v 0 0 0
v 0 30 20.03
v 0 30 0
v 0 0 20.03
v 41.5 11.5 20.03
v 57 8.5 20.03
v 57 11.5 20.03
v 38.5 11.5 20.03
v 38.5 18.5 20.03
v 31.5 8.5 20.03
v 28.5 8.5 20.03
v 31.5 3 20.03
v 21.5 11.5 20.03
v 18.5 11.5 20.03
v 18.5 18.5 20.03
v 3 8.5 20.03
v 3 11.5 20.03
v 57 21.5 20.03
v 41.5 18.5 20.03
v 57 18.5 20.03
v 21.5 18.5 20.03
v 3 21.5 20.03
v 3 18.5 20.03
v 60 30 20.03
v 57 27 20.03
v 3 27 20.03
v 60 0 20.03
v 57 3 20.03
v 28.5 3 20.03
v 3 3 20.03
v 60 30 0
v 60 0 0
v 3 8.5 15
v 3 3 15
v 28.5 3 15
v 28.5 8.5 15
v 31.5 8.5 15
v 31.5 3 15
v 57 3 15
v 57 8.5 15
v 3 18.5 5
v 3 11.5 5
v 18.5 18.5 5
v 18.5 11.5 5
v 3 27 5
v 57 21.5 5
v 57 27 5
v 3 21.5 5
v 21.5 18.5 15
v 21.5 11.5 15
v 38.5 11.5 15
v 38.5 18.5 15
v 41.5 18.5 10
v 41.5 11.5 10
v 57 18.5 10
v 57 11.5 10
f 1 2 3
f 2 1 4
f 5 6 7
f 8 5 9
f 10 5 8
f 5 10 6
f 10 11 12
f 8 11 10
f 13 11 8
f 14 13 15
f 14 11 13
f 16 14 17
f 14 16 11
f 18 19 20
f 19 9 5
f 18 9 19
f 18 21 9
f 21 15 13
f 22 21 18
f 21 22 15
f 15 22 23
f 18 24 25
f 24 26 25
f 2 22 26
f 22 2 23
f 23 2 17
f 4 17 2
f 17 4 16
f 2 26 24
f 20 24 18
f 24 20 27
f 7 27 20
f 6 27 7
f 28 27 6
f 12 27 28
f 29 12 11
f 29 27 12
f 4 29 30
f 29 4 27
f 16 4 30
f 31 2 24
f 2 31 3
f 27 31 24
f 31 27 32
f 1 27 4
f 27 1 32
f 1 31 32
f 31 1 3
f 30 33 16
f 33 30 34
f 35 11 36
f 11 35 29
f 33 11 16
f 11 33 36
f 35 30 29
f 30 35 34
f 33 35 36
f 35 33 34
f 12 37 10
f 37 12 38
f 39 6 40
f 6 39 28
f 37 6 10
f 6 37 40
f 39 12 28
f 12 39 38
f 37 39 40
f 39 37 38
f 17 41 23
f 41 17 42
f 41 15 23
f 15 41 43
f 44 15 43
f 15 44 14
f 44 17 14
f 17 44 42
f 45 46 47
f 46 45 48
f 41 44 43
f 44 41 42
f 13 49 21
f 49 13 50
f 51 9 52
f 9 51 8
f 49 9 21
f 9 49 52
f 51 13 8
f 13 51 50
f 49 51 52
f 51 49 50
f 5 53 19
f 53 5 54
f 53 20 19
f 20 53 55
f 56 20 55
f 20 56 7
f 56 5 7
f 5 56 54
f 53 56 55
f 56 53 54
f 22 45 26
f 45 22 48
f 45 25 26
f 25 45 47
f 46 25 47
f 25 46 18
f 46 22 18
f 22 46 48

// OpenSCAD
// file: caddy_organizer_divider_common.scad
overlap=0.01;

/*
 * separate h,w for top and bottom defines the taper
 * centering defines whether the extra on top or bottom extends fully in the positive direction,
 * or extends equally in both directions.
 * flip***Wise shifts the larger end (top or bottom) in the negative direction so it
 * doesn't need to be mirrored & shifted externally.
 * clipBottomHeight cuts off the lower part of the box up to the height specified
 */
module taperedBox(bw, tw, bl, tl, ht, centerWidthwise=true, centerLengthwise=true, 
        flipWidthwise=false, flipLengthwise=false,
        clipBottomHeight=0) {
    extraWidth = abs(tw-bw);
    extraLength = abs(tl-bl);
    widerWidth = max(tw,bw);
    longerLength = max(tl,bl);
    // Don't shift if not centered or flipped.  When not centered and flipped, shift negative direction
    topWidthShift = ((centerWidthwise) ? -(extraWidth/2) : ((flipWidthwise) ? -extraWidth : 0));
    topLengthShift = ((centerLengthwise) ? -(extraLength/2) : ((flipLengthwise) ? -extraLength : 0));
    echo(str("topWidthShift=",topWidthShift,", topLengthShift=",topLengthShift));
    difference() {
        hull() {
            translate([0,0,0]) 
                cube([bw,bl,overlap]);
            translate([topWidthShift,topLengthShift,ht+overlap])
                cube([tw,tl,overlap]);
        }
        // clip off the bottom of the box (when used as a shallow cutout)        
        translate([-widerWidth/2,-longerLength,-overlap])
            cube([widerWidth*2,longerLength*2,clipBottomHeight+overlap]);
    }
}
// main file
/*
 * Designed for tool caddy found at WM or auto parts stores with
 * center handle and a deep tray on either side.  Makes some of
 * the space useable for holding larger tools upright.
 *
 * TODO: Add support for outer rounded corners
 *
 */
use <caddy_organizer_divider_common.scad>

$fn=50;
overlap=0.01;

// test square sided more wide than long, thicker walls
// evenly split dividers
caddyOrganizerDivider(bottomThickness=5, wallThickness=3, 
    bottomWidth=60, topWidth=60,
    bottomLength=30, topLength=30,
    wallHeight=20,
    crosswaysDividerOffsets=[0,10,20], // rows
    lengthwiseSplits=[[0,30],[0,20,40],[0]],  // row splits
    pocketDepths=[[10,10],[-1,10,15],[-1]]);  // how deep each pocket is

// TODO: implement overcut left and overcut right for each pocket
// to overlap the sidewall.  Changing to cutting the pockets instead of
// not cutting the walls may make it way easier to understand and maintain.

/*
 * This is the primary module for creating a divided box for printing.
 *
 * Default wall thickness is subtracted from the width/length - i.e. The specified
 * dimensions are the "outer" dimension of the overall box.
 * Each offset is aligned with...
 * ALERT: The first element in the crosswaysDivider array is expected to be 0
 *  meaning the corresponding splits are against the first wall
 * ALERT: The first element in each split array is expected to be 0
 *  meaning the corresponding pocketDepth is against the first side
 */
// caddyOrganizerDivider(); // test defaults.
module caddyOrganizerDivider(bottomThickness=2, wallThickness=1, 
        bottomWidth=50, topWidth=65,
        bottomLength=75, topLength=90,
        wallHeight=25,  // includes bottom thickness (REVIEW)
        crosswaysDividerOffsets=[0,30],
        lengthwiseSplits=[[0,25],[0,15,35]], // array of [offset,offset] for each cross section
        pocketDepths=[[5,10],[-1,5,15]],
        centerLengthwise=true,
        centerWidthwise=true,
        allFullDepth=false
        ) {

    // bottom
    cube([bottomWidth,bottomLength,bottomThickness]);

    difference() {
        // outer shell
        taperedBox(bw=bottomWidth, tw=topWidth, bl=bottomLength, tl=topLength, ht=wallHeight+overlap,
            centerLengthwise=centerLengthwise,
            centerWidthwise=centerWidthwise);

        // parameter checks / warnings
        if (crosswaysDividerOffsets[0] != 0)
            echo("Warning: First item in crosswaysDividerOffsets must be zero."); 

        /*
         * WIP: Cut out each pocket 
         * (instead of subtracting lengthwise dividers from the crossways pockets, which is confusing)
         * Note: Inner walls (dividers and splits) are centered at the offset/position, so the wall thickness
         * consumes half from each adjacent pocket.
         * Note: The top width and length of the outer box is assumed to be larger
         *     than the bottom.  The offsets are based on the **bottom**, so the top overhangs
         *     (i.e. "tapers") **stick out** from what would otherwise be square sides.
         */
        // loop the dividers from end to end of the box
        totalTopLengthwiseExtra = (topLength - bottomLength);
        startingTopLengthwiseExtra = (totalTopLengthwiseExtra && centerLengthwise) ? totalTopLengthwiseExtra / 2 : 0;
        endingTopLengthwiseExtra = (totalTopLengthwiseExtra && centerLengthwise) ? totalTopLengthwiseExtra / 2 : totalTopLengthwiseExtra;
        startingInternalTopLengthwiseExtra = (startingTopLengthwiseExtra) ? startingTopLengthwiseExtra : 0;
        endingInternalTopLengthwiseExtra = (endingTopLengthwiseExtra) ? endingTopLengthwiseExtra : 0;
        
        totalTopWidthwiseExtra = (topWidth - bottomWidth);
        startingTopWidthwiseExtra = (totalTopWidthwiseExtra && centerWidthwise) ? totalTopWidthwiseExtra / 2 : 0;
        endingTopWidthwiseExtra = (totalTopWidthwiseExtra && centerWidthwise) ? totalTopWidthwiseExtra / 2 : totalTopWidthwiseExtra;
        startingInternalTopWidthwiseExtra = (startingTopWidthwiseExtra) ? startingTopWidthwiseExtra : 0;
        endingInternalTopWidthwiseExtra = (endingTopWidthwiseExtra) ? endingTopWidthwiseExtra : 0;
        
        for (i=[0:1:len(crosswaysDividerOffsets)-1]) {
            isFirstCrossSection=(i==0);
            isLastCrossSection=(i==(len(crosswaysDividerOffsets)-1));
            // either 0 + outer wall thickness, or offsetPosition (center of wall) + 1/2 (inner) wall thickness
            lengthwiseOffset=crosswaysDividerOffsets[i]+((isFirstCrossSection) ? wallThickness : wallThickness/2);
            // at the ends calculate the extra length that will apply to the current cutout(s)
            lengthwiseExtra=extraAmount(isFirstCrossSection, isLastCrossSection, startingInternalTopLengthwiseExtra,
                    endingInternalTopLengthwiseExtra);
            // lengthwiseExtra=(isFirstCrossSection) ? startingInternalTopLengthwiseExtra :
            //     (isLastCrossSection) ? endingInternalTopLengthwiseExtra : 0;
            lengthwiseWallReduction = (isFirstCrossSection && isLastCrossSection) ? 
                    wallThickness * 2 : // no dividers (i.e. only the 0 divider), but both outer side walls
                    (isFirstCrossSection || isLastCrossSection) ? 
                        wallThickness + wallThickness / 2 : // one outer end wall and 1/2 inner divider
                        wallThickness;  // 1/2 in inner divider wall, twice
            // There should ALWAYS be at least 1 split at zero offset to provide the bottom height
            for (l=[0:1:len(lengthwiseSplits[i])-1]) {
                echo(str("i=",i,", l=",l," - lengthwiseOffset=",lengthwiseOffset,", lengthwiseSplits=",lengthwiseSplits[i]),
                    " - isFirstCrossSection=", isFirstCrossSection,", isLastCrossSection=",isLastCrossSection,
                    " - isFirstSplit=", isFirstSplit,", isLastSplit=",isLastSplit);
                isFirstSplit=(l==0);
                isLastSplit=(l==(len(lengthwiseSplits[i])-1)); 
                // either 0 + outer wall thickness, or offsetPosition (center of wall) + 1/2 (inner) wall thickness
                widthwiseOffset=(lengthwiseSplits[i][l] + ((isFirstSplit) ? wallThickness : wallThickness/2));
                // outer segments reduce by 1/2 wall thickness
                // inner segments reduce by 2 * 1/2 wall thicknesses (i.e. 1 whole)
                widthwiseWallReduction = (isFirstSplit && isLastSplit) ? 
                        wallThickness * 2 : // no splits, both outer walls
                        (isFirstSplit || isLastSplit) ? 
                            wallThickness + wallThickness / 2 : // one outer side wall and 1/2 inner split wall
                            wallThickness; // 1/2 inner split wall, twice
                widthwiseExtra = extraAmount(isFirstSplit, isLastSplit, startingInternalTopWidthwiseExtra,
                        endingInternalTopWidthwiseExtra);
                // widthwiseExtra = (isFirstSplit) ? startingInternalTopWidthwiseExtra :
                //     (isLastSplit) ? endingInternalTopWidthwiseExtra : 0;

                cutoutBl = ((isLastCrossSection) ? bottomLength : crosswaysDividerOffsets[i+1]) -
                        crosswaysDividerOffsets[i] - lengthwiseWallReduction;
                cutoutBw = ((isLastSplit) ? bottomWidth : lengthwiseSplits[i][l+1]) - 
                        lengthwiseSplits[i][l] - widthwiseWallReduction;

                cutoutTl = cutoutBl + lengthwiseExtra;
                cutoutTw = cutoutBw + widthwiseExtra;

                cutoutFlipLengthwise = isFirstCrossSection;
                isFullWidthAndNotCentered = (isFirstSplit && isLastSplit) && !centerWidthwise;
                // Do not flip when no inner splits and not centered
                cutoutFlipWidthwise = isFirstSplit && !isFullWidthAndNotCentered;
                clipBottomHeight=((allFullDepth || pocketDepths[i][l] < 0) ? 0 : wallHeight-pocketDepths[i][l]);
                translate([widthwiseOffset,lengthwiseOffset,bottomThickness])
                    taperedBox(bl=cutoutBl, bw=cutoutBw, tl=cutoutTl, tw=cutoutTw,
                        ht=wallHeight+overlap,
                        centerWidthwise=false, centerLengthwise=false,
                        flipLengthwise=cutoutFlipLengthwise,
                        flipWidthwise=cutoutFlipWidthwise,
                        clipBottomHeight=clipBottomHeight
                        );
            }
        } 
    }
}

function extraAmount(isFirst, isLast, startingExtraAmount, endingExtraAmount) = 
    (isFirst && isLast) ? (startingExtraAmount + endingExtraAmount) : // all of it
        extraAmountPart(isFirst, isLast, startingExtraAmount, endingExtraAmount); // just one part
function extraAmountPart(isFirst, isLast, startingExtraAmount, endingExtraAmount) =
    (isFirst) ? startingExtraAmount : ((isLast) ? endingExtraAmount : 0);

/*
 * Alternative way to specify each row of dividers with array of
 *  [ height, [[width,pocketDepth], [width,pocketDepth], [width,pocketDepth]] ],
 *  [ height, [[width,pocketDepth], [width,pocketDepth]] ],
 *  ...
 */
* translate([75,0,0])
    caddyOrganizerDividerAlt(); // test defaults
module caddyOrganizerDividerAlt(bottomThickness=2, wallThickness=1, 
        bottomWidth=50, topWidth=55,
        bottomLength=75, topLength=80,
        wallHeight=25,
        dividerSpec=[
            [0,[[0,10],[25,0]]],
            [30, [[0,15],[20,0],[30,0]]]
        ]) {
    crosswaysDividerOffsetsAlt=[
        for (i = [0:1:len(dividerSpec)-1]) dividerSpec[i][0]
    ];
    //echo(str("offsets: ", crosswaysDividerOffsetsAlt));

    crosswaysDividerLengthwiseSplitsAlt=[
        for (i = [0:1:len(dividerSpec)-1]) [
            for (j = [0:1:len(dividerSpec[i][1])-1]) dividerSpec[i][1][j][0]
        ]
    ];
    //echo(str("splits: ", crosswaysDividerLengthwiseSplitsAlt));

    pocketDepthsAlt = [
        for (i = [0:1:len(dividerSpec)-1]) [
            for (j = [0:1:len(dividerSpec[i][1])-1]) dividerSpec[i][1][j][1]
        ]
    ];
    echo(str("depths: ", pocketDepthsAlt));

    caddyOrganizerDivider(bottomThickness, wallThickness, 
        bottomWidth, topWidth,
        bottomLength, topLength,
        wallHeight,
        crosswaysDividerOffsets=crosswaysDividerOffsetsAlt,
        lengthwiseSplits=crosswaysDividerLengthwiseSplitsAlt,
        pocketDepths=pocketDepthsAlt);
}
